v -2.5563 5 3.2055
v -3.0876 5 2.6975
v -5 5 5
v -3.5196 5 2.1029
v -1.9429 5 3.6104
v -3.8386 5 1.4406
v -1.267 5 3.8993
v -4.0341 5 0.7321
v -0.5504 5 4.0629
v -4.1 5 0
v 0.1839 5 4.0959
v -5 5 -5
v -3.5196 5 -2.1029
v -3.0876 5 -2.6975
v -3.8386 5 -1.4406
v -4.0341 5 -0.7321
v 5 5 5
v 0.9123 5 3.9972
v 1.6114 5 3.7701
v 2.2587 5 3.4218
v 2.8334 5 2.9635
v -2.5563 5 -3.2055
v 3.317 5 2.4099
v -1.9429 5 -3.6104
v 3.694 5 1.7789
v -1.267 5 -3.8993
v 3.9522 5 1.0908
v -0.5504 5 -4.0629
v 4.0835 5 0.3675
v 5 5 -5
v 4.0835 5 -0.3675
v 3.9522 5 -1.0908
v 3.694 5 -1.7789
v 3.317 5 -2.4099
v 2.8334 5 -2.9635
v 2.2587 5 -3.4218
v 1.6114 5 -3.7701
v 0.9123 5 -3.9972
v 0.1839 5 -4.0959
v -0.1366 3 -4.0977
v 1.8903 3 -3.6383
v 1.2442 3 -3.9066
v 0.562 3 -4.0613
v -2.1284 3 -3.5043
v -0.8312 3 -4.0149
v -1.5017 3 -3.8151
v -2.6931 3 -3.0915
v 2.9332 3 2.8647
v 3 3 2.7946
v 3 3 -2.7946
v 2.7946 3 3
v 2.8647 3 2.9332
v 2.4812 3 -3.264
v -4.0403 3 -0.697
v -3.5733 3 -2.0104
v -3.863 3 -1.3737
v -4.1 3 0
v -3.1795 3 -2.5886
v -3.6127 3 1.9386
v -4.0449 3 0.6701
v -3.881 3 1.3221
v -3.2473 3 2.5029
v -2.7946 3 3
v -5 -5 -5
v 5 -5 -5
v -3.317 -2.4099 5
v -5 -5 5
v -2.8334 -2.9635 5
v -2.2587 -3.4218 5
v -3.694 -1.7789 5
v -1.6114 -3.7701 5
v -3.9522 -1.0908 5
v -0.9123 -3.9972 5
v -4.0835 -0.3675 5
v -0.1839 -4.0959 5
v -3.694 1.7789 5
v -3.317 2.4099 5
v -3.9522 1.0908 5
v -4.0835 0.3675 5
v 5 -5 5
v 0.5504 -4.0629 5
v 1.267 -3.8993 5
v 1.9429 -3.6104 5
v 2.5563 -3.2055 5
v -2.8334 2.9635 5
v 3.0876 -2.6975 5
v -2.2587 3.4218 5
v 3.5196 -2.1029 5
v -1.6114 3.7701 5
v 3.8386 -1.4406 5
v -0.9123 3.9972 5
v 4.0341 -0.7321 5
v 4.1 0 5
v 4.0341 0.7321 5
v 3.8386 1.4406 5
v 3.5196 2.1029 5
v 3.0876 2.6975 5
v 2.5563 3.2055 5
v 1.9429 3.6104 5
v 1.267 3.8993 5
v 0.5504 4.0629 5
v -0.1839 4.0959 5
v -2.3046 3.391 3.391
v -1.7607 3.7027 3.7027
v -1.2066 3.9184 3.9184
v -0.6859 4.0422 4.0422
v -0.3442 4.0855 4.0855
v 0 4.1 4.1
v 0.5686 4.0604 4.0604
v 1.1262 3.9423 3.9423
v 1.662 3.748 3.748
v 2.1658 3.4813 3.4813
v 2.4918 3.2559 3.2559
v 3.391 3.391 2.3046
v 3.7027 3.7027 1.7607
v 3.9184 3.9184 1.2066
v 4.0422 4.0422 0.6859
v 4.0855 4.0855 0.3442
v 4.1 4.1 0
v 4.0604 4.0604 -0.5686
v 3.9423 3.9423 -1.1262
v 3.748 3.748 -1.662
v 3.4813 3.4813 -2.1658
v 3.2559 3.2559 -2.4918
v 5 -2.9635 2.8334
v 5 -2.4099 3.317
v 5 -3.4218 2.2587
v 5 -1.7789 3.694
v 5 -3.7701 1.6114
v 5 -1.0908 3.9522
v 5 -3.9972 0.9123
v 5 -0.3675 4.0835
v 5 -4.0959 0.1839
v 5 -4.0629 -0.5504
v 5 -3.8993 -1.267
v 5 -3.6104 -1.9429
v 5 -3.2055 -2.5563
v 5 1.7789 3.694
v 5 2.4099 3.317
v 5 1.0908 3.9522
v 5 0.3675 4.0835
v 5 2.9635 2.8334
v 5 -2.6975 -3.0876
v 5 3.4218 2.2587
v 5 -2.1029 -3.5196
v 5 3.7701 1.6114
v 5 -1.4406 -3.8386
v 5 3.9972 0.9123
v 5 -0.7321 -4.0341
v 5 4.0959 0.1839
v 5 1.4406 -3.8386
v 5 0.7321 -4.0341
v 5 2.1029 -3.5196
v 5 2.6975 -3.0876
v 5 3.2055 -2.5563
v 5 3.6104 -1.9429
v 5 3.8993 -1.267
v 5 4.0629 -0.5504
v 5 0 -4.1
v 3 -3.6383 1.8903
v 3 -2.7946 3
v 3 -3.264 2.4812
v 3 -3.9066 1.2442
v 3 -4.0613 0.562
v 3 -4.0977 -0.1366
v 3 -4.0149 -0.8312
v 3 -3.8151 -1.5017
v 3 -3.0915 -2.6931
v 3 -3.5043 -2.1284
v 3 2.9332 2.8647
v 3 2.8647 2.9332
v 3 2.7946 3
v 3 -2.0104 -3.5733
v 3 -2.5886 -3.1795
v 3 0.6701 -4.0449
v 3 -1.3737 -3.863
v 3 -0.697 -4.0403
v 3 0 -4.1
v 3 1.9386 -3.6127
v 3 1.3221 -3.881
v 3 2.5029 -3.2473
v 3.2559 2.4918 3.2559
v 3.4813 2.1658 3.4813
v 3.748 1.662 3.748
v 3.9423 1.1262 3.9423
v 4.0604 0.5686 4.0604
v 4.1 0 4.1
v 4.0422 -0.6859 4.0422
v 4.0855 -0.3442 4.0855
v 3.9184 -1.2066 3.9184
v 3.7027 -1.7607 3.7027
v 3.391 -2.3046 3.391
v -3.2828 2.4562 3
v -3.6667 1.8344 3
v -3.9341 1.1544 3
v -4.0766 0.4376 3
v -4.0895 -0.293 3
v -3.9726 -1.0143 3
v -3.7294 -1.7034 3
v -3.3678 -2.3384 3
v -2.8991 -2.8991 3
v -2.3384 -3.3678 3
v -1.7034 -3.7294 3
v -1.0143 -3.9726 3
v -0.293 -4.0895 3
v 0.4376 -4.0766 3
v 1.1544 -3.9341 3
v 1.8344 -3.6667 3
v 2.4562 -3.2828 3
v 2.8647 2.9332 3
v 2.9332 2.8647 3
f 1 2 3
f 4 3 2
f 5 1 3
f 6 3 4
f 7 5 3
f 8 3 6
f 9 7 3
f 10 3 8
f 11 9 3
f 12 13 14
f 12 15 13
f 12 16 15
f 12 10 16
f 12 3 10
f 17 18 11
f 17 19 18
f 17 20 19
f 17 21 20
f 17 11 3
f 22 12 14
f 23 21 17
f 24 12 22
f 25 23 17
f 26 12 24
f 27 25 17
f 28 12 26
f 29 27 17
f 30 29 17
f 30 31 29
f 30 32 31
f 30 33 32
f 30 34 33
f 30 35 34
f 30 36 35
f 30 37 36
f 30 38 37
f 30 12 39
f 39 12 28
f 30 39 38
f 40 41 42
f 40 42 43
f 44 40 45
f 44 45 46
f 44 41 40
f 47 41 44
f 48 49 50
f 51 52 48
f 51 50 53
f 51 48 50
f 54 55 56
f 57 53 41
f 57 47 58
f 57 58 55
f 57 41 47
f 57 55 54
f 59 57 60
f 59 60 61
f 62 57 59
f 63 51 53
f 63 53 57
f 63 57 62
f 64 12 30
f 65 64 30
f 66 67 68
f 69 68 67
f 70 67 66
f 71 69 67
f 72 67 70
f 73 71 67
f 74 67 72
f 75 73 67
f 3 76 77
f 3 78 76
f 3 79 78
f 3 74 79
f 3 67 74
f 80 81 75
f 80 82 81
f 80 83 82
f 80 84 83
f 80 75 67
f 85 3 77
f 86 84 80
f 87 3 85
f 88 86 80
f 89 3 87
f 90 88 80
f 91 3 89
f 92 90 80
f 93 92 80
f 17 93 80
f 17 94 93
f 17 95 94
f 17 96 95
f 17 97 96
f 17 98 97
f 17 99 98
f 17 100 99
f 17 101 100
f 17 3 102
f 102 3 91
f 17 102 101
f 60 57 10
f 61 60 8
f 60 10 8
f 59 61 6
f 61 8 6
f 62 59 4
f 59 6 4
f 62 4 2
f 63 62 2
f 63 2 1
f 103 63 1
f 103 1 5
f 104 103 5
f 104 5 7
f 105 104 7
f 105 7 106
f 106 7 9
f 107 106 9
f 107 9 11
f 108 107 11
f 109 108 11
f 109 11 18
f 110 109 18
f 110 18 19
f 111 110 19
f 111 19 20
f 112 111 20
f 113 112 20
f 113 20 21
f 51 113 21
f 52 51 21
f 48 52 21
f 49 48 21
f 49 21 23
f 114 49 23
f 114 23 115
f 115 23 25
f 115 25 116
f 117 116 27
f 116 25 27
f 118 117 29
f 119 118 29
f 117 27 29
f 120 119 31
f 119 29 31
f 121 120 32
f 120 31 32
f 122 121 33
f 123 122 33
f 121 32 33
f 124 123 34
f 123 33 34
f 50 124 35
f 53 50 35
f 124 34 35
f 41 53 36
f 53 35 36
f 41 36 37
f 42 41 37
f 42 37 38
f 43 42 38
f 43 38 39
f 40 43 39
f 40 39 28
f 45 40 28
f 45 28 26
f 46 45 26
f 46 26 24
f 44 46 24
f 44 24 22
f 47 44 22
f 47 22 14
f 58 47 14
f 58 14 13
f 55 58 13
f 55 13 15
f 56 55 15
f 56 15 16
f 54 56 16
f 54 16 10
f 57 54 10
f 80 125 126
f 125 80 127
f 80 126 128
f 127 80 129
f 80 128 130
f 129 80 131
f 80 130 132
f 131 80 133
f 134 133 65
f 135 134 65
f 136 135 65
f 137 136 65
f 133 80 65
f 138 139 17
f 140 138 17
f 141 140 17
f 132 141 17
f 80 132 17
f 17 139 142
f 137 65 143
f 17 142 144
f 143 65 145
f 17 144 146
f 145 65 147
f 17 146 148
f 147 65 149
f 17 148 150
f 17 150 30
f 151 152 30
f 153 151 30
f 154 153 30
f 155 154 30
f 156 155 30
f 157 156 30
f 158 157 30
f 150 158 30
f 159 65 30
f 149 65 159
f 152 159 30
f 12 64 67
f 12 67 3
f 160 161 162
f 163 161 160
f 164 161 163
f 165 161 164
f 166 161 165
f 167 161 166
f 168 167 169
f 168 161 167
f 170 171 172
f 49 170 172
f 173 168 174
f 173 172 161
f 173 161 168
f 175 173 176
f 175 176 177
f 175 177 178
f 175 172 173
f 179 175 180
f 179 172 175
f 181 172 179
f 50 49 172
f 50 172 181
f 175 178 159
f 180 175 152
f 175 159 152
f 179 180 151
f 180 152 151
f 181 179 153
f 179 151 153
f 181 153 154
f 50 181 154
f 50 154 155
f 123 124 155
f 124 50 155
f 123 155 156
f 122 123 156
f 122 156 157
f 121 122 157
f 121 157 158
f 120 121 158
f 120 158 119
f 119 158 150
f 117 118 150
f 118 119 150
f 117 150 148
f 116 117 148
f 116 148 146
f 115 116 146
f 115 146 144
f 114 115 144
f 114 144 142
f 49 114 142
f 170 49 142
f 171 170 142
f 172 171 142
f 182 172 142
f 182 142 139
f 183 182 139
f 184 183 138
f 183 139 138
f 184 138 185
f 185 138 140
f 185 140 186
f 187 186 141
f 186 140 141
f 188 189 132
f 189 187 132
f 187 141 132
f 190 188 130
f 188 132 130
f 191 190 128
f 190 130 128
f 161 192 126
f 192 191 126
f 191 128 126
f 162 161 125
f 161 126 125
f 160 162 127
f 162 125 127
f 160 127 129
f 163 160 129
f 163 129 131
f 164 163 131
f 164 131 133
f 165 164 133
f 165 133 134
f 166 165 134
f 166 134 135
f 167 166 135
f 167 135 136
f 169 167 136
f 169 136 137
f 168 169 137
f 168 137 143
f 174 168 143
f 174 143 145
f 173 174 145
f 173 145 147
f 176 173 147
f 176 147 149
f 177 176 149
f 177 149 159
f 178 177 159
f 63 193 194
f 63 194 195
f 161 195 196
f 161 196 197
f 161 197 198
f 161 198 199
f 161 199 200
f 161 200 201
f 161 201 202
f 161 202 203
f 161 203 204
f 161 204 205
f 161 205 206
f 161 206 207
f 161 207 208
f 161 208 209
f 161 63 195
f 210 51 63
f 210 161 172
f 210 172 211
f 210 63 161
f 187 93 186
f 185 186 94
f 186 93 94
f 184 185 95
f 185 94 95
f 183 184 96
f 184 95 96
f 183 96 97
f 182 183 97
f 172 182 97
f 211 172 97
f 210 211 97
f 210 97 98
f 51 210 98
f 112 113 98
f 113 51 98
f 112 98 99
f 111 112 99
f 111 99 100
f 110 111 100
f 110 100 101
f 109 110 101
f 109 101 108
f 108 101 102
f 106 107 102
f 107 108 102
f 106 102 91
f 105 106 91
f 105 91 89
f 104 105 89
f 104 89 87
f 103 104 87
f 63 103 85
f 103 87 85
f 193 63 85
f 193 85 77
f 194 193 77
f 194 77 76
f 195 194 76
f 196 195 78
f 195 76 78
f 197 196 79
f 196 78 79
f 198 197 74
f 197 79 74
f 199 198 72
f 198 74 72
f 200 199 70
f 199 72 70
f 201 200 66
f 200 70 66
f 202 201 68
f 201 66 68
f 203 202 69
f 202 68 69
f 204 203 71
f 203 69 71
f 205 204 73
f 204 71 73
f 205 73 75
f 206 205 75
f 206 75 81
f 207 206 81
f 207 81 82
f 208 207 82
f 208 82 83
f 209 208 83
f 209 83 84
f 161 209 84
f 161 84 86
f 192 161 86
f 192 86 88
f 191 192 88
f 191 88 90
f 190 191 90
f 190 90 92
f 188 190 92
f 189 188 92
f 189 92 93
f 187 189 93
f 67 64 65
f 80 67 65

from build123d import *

# Parameters (mm, degrees)
BOSS_EXTRUDE1_DEPTH      = 5
BOSS_EXTRUDE1_DEPTH_BACK = 5
SKETCH1_W                = 10
SKETCH1_H                = 10
SKETCH2_R                = 4.1
CUT_EXTRUDE1_DEPTH       = 2
SKETCH5_R                = 4.1
CUT_EXTRUDE2_DEPTH       = 2
SKETCH6_R                = 4.1
CUT_EXTRUDE3_DEPTH       = 2


with BuildPart() as part:
    # Sketch1 → Boss-Extrude1 (new, two sides: drawn at the far end of the back side and taken through both)
    with BuildSketch(Plane.XY.offset(-BOSS_EXTRUDE1_DEPTH_BACK)):
        Rectangle(SKETCH1_W, SKETCH1_H)
    extrude(amount=BOSS_EXTRUDE1_DEPTH + BOSS_EXTRUDE1_DEPTH_BACK)

    # Sketch2 → Cut-Extrude1 (cut)
    with BuildSketch(Plane(origin=(0, 5, 0), x_dir=(1, 0, 0), z_dir=(0, 1, 0))):
        Circle(SKETCH2_R)
    extrude(amount=-CUT_EXTRUDE1_DEPTH, mode=Mode.SUBTRACT)

    # Sketch5 → Cut-Extrude2 (cut)
    with BuildSketch(Plane.XY.offset(5)):
        Circle(SKETCH5_R)
    extrude(amount=-CUT_EXTRUDE2_DEPTH, mode=Mode.SUBTRACT)

    # Sketch6 → Cut-Extrude3 (cut)
    with BuildSketch(Plane(origin=(5, 0, 0), x_dir=(0, 0, -1), z_dir=(1, 0, 0))):
        Circle(SKETCH6_R)
    extrude(amount=-CUT_EXTRUDE3_DEPTH, mode=Mode.SUBTRACT)


solid = part.part
